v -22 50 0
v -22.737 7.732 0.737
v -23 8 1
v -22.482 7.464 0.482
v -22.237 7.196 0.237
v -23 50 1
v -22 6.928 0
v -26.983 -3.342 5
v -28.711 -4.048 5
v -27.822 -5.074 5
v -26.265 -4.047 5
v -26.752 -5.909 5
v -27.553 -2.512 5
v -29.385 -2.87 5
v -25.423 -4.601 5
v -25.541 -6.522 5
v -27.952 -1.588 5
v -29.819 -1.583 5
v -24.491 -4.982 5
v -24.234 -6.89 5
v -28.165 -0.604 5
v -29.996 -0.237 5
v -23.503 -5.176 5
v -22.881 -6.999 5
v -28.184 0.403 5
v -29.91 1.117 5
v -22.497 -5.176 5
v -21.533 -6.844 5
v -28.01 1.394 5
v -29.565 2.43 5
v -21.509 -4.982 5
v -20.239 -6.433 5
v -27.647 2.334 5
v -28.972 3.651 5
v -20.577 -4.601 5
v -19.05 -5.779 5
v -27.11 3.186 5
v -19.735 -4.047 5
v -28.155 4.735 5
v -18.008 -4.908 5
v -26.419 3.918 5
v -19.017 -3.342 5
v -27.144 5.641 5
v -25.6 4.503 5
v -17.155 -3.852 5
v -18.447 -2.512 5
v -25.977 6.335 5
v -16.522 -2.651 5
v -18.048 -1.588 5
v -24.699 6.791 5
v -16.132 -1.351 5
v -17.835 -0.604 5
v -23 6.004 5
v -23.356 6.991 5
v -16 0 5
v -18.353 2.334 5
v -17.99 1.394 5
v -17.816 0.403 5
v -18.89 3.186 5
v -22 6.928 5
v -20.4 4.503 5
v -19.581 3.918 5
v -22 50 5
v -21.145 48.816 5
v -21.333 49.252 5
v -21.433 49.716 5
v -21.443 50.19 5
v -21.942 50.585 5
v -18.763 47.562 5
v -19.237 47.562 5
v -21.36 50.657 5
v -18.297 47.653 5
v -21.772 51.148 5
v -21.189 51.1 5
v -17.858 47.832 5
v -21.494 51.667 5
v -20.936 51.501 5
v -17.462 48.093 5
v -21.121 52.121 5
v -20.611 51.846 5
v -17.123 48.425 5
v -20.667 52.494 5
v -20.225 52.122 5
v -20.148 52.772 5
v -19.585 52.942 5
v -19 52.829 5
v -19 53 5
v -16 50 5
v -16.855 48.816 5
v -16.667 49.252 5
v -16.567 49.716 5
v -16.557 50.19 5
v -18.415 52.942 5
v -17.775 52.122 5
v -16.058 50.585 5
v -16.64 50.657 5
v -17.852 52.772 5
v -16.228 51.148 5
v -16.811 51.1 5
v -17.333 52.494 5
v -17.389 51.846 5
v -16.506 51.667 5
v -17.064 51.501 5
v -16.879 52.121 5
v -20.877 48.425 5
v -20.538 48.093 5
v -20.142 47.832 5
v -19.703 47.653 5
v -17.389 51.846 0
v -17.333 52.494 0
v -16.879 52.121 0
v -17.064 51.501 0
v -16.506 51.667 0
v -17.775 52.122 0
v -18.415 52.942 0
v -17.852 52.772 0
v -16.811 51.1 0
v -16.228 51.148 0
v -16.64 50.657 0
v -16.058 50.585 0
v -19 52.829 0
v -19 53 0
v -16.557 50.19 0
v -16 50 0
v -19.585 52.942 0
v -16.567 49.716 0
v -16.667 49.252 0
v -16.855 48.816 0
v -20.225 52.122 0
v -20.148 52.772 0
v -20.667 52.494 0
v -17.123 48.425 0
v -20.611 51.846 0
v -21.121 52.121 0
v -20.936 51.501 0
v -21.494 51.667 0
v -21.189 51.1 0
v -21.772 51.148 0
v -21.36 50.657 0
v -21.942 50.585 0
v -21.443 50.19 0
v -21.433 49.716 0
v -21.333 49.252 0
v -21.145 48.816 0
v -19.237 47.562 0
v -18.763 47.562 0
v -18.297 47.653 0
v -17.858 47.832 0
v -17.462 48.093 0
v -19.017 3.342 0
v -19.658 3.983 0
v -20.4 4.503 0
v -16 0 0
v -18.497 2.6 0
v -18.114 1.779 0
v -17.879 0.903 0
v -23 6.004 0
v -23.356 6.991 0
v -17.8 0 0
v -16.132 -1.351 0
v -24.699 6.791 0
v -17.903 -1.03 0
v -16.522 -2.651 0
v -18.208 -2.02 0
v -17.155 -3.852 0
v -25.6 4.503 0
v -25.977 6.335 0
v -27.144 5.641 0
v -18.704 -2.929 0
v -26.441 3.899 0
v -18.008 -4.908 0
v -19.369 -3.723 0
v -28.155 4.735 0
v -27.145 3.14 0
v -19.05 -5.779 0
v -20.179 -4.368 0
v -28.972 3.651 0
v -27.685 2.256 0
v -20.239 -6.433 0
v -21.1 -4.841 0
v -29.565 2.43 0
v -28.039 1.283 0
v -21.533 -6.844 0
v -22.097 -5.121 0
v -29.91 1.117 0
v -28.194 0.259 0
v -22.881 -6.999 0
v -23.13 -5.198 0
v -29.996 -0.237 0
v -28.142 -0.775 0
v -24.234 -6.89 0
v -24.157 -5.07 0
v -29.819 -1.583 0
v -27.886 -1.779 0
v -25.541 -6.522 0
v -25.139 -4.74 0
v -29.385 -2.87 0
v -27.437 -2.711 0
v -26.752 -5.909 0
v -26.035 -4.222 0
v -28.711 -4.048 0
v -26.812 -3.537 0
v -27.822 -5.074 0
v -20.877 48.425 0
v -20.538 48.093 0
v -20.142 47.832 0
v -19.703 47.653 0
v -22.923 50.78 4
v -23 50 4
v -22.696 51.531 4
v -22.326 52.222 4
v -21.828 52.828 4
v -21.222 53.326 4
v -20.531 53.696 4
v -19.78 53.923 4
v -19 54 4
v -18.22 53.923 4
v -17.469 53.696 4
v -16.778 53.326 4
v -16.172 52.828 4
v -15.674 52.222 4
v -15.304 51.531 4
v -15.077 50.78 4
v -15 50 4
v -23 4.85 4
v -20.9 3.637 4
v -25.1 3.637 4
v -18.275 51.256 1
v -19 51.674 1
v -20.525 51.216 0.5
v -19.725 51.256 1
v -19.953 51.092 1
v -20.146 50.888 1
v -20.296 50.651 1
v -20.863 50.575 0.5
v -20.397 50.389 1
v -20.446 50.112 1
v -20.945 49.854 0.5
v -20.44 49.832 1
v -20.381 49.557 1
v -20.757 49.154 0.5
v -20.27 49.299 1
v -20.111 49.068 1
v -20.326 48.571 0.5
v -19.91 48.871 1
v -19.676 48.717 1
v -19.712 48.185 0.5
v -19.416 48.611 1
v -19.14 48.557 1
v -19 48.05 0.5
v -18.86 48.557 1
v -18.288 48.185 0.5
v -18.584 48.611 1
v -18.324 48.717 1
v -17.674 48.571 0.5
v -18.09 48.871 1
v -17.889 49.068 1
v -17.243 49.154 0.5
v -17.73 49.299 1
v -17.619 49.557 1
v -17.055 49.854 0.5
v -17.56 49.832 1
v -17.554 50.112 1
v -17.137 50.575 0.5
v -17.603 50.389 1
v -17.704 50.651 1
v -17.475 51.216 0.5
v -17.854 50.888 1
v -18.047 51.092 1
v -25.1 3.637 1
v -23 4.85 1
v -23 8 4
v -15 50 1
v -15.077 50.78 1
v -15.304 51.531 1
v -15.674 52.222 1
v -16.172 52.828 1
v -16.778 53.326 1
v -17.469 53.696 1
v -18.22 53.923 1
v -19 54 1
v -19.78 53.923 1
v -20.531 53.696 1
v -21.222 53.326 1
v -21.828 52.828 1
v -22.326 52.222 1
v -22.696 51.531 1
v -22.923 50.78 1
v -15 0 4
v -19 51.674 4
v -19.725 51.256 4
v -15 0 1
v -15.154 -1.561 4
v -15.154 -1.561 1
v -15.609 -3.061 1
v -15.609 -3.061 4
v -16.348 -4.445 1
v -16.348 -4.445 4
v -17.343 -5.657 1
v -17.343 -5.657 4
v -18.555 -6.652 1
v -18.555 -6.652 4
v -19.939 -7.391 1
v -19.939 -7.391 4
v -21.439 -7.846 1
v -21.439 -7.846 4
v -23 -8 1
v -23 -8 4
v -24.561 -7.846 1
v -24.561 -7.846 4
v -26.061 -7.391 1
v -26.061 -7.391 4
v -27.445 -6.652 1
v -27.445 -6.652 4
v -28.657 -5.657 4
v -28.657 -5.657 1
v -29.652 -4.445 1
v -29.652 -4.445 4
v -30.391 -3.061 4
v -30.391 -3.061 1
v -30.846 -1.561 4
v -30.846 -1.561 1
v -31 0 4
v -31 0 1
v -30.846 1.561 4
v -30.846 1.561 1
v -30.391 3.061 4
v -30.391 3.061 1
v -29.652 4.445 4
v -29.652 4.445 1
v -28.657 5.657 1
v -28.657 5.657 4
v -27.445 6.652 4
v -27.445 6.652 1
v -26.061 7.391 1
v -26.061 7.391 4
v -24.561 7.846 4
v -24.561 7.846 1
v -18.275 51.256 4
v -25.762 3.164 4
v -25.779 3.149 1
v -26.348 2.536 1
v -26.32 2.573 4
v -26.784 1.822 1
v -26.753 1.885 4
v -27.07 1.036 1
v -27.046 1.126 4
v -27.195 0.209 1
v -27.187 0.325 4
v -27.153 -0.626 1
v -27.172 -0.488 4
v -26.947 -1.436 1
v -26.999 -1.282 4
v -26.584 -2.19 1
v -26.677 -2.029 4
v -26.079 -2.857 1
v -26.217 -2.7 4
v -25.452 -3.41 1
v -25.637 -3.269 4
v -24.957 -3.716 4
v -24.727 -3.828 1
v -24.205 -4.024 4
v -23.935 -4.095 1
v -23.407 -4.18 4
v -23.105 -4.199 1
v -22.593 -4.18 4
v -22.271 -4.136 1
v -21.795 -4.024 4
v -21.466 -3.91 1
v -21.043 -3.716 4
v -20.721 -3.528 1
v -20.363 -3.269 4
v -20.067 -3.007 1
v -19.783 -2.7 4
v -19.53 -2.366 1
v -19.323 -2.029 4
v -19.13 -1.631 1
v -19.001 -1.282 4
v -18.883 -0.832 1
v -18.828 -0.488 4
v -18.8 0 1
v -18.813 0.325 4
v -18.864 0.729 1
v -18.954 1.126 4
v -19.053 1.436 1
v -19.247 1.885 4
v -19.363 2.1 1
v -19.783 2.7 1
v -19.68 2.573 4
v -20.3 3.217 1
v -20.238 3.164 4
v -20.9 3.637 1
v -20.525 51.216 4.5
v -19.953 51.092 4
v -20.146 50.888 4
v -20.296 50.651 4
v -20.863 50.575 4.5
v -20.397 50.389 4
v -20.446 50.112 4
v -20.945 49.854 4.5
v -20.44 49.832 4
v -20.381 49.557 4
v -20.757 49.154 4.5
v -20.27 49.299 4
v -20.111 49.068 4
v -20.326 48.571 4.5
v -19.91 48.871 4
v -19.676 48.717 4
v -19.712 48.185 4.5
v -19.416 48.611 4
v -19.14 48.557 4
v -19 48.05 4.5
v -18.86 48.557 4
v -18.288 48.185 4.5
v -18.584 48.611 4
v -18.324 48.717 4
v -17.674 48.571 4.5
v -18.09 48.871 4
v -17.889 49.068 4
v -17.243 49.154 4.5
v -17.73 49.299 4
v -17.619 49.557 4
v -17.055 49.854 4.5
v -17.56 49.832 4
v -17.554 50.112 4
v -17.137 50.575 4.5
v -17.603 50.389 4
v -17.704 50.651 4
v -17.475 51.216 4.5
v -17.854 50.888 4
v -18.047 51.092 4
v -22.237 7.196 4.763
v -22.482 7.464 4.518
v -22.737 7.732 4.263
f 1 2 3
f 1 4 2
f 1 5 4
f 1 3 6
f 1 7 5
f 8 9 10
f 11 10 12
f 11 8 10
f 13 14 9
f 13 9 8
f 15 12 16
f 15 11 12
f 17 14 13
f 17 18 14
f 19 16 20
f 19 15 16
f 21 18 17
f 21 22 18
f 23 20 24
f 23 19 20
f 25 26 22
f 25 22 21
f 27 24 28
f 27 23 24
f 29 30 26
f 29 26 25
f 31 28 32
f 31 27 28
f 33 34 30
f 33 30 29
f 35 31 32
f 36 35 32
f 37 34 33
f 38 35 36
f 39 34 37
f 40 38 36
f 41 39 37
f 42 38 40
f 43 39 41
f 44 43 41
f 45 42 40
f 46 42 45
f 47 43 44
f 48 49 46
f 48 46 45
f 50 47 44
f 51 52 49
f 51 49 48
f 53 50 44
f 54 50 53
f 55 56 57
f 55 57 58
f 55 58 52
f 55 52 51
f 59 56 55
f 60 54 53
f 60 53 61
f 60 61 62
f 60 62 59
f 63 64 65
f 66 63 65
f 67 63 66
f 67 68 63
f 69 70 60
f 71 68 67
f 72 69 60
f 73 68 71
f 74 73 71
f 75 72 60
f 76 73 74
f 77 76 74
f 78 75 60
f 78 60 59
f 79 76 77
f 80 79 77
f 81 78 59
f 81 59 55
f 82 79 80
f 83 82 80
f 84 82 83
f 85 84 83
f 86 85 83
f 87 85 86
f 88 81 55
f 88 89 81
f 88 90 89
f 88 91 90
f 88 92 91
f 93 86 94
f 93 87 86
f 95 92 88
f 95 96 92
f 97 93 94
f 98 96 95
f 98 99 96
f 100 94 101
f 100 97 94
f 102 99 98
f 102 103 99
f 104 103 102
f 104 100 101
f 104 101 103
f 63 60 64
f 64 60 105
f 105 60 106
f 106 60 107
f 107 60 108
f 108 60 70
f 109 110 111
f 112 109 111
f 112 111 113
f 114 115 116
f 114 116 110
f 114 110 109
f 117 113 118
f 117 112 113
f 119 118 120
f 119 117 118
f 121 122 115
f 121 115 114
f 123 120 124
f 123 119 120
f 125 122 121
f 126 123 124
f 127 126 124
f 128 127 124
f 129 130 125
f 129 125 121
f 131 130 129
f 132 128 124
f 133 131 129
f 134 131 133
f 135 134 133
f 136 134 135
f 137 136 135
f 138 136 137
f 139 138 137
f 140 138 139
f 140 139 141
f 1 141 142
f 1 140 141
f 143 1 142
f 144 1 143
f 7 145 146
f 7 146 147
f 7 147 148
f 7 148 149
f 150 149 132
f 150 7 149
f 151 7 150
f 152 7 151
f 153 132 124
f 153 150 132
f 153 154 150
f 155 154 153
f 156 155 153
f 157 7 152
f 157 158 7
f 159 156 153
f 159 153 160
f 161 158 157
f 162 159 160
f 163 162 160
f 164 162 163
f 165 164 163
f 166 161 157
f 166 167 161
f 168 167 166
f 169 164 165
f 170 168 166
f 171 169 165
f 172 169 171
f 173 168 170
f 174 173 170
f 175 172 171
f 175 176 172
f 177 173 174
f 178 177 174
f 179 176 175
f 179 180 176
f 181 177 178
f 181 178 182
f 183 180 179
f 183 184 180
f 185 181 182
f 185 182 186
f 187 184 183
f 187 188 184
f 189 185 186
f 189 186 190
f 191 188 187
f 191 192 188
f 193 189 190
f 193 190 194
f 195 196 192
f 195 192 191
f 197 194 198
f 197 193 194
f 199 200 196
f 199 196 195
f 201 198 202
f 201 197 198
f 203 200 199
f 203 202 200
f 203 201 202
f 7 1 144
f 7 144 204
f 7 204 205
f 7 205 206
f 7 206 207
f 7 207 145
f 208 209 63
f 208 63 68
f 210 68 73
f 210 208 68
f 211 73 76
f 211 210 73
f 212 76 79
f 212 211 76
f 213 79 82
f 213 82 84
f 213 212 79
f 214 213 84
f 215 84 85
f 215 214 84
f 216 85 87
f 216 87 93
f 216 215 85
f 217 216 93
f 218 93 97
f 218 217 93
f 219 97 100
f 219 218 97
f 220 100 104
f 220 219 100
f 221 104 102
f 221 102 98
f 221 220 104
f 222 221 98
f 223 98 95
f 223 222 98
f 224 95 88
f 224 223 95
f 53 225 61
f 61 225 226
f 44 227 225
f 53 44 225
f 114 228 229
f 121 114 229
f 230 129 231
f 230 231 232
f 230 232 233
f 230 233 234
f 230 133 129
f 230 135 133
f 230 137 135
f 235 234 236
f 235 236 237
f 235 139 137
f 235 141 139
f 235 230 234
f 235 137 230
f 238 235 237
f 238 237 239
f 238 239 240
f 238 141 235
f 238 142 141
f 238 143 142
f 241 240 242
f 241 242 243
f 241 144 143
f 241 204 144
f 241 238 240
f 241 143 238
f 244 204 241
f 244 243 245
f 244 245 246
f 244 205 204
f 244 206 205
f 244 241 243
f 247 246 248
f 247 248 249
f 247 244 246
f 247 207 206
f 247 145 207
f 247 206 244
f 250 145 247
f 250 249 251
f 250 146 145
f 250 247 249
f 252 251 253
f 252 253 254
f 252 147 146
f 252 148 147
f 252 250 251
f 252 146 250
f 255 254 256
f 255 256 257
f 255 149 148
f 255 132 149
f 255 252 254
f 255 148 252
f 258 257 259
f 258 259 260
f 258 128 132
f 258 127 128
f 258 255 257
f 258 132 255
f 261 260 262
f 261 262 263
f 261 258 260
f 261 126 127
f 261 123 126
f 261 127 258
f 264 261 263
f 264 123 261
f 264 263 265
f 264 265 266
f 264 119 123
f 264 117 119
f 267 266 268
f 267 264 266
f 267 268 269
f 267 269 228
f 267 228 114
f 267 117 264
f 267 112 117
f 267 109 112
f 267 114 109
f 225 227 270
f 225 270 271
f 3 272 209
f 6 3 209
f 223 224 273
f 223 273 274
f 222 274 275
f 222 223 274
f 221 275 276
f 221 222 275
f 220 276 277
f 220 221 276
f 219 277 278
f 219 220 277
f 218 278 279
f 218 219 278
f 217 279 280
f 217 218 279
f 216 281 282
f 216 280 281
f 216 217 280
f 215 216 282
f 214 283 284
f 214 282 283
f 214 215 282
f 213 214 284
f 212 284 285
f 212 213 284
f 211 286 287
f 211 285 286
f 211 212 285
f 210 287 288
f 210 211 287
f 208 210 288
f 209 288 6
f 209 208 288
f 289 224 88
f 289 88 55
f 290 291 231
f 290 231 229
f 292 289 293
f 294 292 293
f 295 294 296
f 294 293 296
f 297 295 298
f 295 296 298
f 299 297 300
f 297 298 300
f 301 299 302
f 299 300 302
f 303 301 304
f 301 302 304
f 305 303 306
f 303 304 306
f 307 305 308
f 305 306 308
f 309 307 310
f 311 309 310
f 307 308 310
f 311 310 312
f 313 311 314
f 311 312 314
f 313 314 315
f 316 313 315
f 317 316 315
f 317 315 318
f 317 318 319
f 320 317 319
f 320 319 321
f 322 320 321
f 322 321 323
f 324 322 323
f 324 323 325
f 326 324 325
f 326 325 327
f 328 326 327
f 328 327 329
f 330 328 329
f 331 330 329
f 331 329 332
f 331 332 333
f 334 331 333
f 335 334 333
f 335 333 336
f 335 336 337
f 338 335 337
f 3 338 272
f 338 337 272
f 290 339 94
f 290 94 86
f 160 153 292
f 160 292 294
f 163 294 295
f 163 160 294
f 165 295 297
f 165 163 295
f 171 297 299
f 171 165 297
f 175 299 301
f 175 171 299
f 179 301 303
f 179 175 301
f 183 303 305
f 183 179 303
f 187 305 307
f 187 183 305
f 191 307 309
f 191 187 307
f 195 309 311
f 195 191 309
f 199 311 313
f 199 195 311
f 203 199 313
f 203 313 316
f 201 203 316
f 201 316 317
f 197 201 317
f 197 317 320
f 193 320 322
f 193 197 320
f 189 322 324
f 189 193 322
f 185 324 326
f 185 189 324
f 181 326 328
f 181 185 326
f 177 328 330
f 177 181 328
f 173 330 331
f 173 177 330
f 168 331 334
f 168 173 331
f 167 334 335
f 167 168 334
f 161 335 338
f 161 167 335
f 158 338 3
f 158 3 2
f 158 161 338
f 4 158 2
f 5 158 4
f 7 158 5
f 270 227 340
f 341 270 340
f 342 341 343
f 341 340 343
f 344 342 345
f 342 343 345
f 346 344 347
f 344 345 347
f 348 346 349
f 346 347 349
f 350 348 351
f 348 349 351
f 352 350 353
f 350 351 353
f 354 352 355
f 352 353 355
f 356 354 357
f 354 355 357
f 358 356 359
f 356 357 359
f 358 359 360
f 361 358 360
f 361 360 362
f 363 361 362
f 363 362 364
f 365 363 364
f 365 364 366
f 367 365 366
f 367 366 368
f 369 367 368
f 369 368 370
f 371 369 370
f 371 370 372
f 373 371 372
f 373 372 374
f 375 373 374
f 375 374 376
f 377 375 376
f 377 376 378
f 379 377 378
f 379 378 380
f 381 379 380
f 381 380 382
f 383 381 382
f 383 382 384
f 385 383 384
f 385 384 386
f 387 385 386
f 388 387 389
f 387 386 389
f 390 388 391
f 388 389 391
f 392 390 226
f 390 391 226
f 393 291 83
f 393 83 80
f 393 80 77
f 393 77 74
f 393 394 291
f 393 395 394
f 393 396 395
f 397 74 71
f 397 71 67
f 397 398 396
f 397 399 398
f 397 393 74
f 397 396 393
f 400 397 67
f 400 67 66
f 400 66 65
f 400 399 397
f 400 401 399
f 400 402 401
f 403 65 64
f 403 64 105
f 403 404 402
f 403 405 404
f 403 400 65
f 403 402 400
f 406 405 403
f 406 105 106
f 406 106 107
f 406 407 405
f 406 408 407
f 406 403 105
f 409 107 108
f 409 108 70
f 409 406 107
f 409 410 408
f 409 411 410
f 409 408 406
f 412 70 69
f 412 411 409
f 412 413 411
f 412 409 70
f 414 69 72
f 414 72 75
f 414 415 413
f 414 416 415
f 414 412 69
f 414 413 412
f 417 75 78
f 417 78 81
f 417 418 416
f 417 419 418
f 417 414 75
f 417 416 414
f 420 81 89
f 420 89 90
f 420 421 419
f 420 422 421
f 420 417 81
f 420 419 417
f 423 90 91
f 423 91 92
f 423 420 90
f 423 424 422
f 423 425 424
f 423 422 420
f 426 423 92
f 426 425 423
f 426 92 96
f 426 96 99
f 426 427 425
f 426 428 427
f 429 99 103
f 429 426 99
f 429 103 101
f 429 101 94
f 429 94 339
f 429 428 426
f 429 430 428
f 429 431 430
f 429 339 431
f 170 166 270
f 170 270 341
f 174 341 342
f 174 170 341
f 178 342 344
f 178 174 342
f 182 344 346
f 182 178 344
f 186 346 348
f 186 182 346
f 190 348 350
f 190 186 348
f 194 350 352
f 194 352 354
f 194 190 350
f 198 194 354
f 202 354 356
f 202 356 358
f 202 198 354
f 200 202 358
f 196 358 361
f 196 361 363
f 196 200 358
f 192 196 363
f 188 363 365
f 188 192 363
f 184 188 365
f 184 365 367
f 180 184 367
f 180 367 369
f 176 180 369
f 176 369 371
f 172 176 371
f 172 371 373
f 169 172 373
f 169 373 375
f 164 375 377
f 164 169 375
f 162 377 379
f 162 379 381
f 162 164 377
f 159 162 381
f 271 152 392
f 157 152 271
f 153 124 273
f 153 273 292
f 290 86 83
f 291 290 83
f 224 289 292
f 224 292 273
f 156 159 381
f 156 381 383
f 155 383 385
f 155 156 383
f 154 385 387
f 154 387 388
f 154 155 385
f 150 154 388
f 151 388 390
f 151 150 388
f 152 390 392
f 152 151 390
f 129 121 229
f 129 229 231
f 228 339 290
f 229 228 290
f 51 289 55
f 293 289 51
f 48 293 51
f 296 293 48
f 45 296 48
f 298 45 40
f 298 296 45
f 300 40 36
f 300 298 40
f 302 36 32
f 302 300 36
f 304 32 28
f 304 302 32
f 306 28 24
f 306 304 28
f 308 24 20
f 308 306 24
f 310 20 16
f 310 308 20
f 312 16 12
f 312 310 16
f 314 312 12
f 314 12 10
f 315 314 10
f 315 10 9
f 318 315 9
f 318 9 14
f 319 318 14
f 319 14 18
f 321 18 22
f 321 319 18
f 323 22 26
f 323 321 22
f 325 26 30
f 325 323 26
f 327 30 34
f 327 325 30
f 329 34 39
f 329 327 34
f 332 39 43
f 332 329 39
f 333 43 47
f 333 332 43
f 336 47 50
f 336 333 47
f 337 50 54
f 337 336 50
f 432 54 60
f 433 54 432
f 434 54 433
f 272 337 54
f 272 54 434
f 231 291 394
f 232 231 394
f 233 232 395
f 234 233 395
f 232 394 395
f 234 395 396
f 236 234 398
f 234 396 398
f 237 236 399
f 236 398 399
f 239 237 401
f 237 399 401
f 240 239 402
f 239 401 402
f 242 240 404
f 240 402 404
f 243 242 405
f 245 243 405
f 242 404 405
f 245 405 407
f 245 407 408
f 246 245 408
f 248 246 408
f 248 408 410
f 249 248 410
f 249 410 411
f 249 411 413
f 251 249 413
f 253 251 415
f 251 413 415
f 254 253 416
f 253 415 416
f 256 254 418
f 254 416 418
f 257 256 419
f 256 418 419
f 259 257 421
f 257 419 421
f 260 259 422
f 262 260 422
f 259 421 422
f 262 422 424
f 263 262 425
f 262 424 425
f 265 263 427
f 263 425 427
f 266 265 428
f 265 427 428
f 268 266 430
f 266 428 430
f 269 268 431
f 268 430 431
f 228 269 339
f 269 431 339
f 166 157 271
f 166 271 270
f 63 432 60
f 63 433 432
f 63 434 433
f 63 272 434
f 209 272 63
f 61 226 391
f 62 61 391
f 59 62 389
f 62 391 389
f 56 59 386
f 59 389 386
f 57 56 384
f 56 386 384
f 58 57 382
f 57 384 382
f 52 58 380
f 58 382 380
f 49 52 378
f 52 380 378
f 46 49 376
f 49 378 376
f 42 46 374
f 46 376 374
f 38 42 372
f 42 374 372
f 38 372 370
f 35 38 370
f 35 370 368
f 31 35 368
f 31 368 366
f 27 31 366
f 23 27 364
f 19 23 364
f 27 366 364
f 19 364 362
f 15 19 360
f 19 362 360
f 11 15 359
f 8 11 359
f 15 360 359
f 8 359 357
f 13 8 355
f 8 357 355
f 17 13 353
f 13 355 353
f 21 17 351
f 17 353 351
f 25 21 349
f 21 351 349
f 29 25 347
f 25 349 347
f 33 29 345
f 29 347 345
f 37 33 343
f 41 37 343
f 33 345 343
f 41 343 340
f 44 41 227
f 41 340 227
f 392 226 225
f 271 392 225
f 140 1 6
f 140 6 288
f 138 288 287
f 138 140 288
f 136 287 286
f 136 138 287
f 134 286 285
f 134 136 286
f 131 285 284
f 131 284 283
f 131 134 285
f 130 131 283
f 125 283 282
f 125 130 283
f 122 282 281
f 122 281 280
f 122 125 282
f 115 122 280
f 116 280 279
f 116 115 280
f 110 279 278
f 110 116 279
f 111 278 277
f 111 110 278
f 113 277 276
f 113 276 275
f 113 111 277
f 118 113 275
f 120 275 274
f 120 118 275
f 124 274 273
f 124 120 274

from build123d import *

# Parameters (mm, degrees)
SKETCH_R                   = 8
PAD_DEPTH                  = 5
PAD001_DEPTH               = 5
SKETCH002_R                = 1.45
HOLE_DEPTH                 = 25
HOLE_TEARDROPS_DEPTH       = 25
SKETCH003_R                = 8
PAD002_DEPTH               = 0.9
SKETCH004_R                = 4.2
HOLE001_DEPTH              = 25
HOLE001_TEARDROPS_DEPTH    = 25
HOLE001_TEARDROPS_FACE12_R = 8
POCKET_DEPTH               = 0.9
CHAMFER_SIZE               = 1


with BuildPart() as part:
    # Sketch → Pad (new body)
    with BuildSketch(Plane.XY):
        with Locations((-23, 0)):
            Circle(SKETCH_R)
    extrude(amount=PAD_DEPTH)

    # Sketch001 (on Face3 of Pad) → Pad001 (join)
    with BuildSketch(Plane.XY.offset(5)):
        with BuildLine():
            ThreePointArc((-23, 0), (-19, -4), (-15, 0))
            Line((-15, 0), (-15, 50))
            ThreePointArc((-15, 50), (-19, 54), (-23, 50))
            Line((-23, 0), (-23, 50))
        make_face()
    extrude(amount=-PAD001_DEPTH)

    # Sketch002 (on Face6 of Pad001) → Hole (cut)
    with BuildSketch(Plane.XY.offset(5)):
        with Locations((-19, 50)):
            Circle(SKETCH002_R)
    extrude(amount=-HOLE_DEPTH, mode=Mode.SUBTRACT)

    # Sketch002_Teardrops (on Sketch) → Hole_Teardrops (cut)
    with BuildSketch(Plane.XY.offset(5)):
        with BuildLine():
            ThreePointArc((-19.725, 51.255737), (-19, 48.55), (-18.275, 51.255737))
            Line((-18.275, 51.255737), (-19, 51.674316))
            Line((-19.725, 51.255737), (-19, 51.674316))
        make_face()
    extrude(amount=-HOLE_TEARDROPS_DEPTH, mode=Mode.SUBTRACT)

    # Sketch003 (on Face4 of Hole_Teardrops) → Pad002 (join)
    with BuildSketch(Plane(origin=(0, 0, 0), x_dir=(1, 0, 0), z_dir=(0, 0, -1))):
        with Locations((-23, 0)):
            Circle(SKETCH003_R)
    extrude(amount=PAD002_DEPTH)

    # Sketch004 (on Face2 of Pad002) → Hole001 (cut)
    with BuildSketch(Plane.XY.offset(5)):
        with Locations((-23, 0)):
            Circle(SKETCH004_R)
    extrude(amount=-HOLE001_DEPTH, mode=Mode.SUBTRACT)

    # Sketch004_Teardrops (on Sketch) → Hole001_Teardrops (cut)
    with BuildSketch(Plane.XY.offset(5)):
        with BuildLine():
            ThreePointArc((-25.1, 3.637307), (-23, -4.2), (-20.9, 3.637307))
            Line((-20.9, 3.637307), (-23, 4.849742))
            Line((-25.1, 3.637307), (-23, 4.849742))
        make_face()
    extrude(amount=-HOLE001_TEARDROPS_DEPTH, mode=Mode.SUBTRACT)

    # Hole001_Teardrops Face12 → Pocket (cut)
    with BuildSketch(Plane(origin=(-23, -0.028446, -0.9), x_dir=(0, -1, 0), z_dir=(0, 0, -1))):
        with Locations((-0.028446, 0)):
            Circle(HOLE001_TEARDROPS_FACE12_R)
        with BuildLine():
            ThreePointArc((-0.028446, -4.2), (-2.128446, -3.637307), (-3.665753, -2.1))
            Line((-3.665753, -2.1), (-4.878188, 0))
            Line((-4.878188, 0), (-3.665753, 2.1))
            ThreePointArc((-3.665753, 2.1), (3.608861, 2.1), (-0.028446, -4.2))
        make_face(mode=Mode.SUBTRACT)
    extrude(amount=-POCKET_DEPTH, mode=Mode.SUBTRACT)

    # Chamfer
    chamfer_edges = [part.edges().sort_by_distance(p)[0] for p in [
        (-19.725, 48.744263, 0),
        (-23, 29, 0),
        (-23, 29, 5),
        (-25.1, -3.637307, 0),
        (-25.1, -3.637307, 5),
        (-19.725, 48.744263, 5),
    ]]
    chamfer(chamfer_edges, length=CHAMFER_SIZE)


solid = part.part
